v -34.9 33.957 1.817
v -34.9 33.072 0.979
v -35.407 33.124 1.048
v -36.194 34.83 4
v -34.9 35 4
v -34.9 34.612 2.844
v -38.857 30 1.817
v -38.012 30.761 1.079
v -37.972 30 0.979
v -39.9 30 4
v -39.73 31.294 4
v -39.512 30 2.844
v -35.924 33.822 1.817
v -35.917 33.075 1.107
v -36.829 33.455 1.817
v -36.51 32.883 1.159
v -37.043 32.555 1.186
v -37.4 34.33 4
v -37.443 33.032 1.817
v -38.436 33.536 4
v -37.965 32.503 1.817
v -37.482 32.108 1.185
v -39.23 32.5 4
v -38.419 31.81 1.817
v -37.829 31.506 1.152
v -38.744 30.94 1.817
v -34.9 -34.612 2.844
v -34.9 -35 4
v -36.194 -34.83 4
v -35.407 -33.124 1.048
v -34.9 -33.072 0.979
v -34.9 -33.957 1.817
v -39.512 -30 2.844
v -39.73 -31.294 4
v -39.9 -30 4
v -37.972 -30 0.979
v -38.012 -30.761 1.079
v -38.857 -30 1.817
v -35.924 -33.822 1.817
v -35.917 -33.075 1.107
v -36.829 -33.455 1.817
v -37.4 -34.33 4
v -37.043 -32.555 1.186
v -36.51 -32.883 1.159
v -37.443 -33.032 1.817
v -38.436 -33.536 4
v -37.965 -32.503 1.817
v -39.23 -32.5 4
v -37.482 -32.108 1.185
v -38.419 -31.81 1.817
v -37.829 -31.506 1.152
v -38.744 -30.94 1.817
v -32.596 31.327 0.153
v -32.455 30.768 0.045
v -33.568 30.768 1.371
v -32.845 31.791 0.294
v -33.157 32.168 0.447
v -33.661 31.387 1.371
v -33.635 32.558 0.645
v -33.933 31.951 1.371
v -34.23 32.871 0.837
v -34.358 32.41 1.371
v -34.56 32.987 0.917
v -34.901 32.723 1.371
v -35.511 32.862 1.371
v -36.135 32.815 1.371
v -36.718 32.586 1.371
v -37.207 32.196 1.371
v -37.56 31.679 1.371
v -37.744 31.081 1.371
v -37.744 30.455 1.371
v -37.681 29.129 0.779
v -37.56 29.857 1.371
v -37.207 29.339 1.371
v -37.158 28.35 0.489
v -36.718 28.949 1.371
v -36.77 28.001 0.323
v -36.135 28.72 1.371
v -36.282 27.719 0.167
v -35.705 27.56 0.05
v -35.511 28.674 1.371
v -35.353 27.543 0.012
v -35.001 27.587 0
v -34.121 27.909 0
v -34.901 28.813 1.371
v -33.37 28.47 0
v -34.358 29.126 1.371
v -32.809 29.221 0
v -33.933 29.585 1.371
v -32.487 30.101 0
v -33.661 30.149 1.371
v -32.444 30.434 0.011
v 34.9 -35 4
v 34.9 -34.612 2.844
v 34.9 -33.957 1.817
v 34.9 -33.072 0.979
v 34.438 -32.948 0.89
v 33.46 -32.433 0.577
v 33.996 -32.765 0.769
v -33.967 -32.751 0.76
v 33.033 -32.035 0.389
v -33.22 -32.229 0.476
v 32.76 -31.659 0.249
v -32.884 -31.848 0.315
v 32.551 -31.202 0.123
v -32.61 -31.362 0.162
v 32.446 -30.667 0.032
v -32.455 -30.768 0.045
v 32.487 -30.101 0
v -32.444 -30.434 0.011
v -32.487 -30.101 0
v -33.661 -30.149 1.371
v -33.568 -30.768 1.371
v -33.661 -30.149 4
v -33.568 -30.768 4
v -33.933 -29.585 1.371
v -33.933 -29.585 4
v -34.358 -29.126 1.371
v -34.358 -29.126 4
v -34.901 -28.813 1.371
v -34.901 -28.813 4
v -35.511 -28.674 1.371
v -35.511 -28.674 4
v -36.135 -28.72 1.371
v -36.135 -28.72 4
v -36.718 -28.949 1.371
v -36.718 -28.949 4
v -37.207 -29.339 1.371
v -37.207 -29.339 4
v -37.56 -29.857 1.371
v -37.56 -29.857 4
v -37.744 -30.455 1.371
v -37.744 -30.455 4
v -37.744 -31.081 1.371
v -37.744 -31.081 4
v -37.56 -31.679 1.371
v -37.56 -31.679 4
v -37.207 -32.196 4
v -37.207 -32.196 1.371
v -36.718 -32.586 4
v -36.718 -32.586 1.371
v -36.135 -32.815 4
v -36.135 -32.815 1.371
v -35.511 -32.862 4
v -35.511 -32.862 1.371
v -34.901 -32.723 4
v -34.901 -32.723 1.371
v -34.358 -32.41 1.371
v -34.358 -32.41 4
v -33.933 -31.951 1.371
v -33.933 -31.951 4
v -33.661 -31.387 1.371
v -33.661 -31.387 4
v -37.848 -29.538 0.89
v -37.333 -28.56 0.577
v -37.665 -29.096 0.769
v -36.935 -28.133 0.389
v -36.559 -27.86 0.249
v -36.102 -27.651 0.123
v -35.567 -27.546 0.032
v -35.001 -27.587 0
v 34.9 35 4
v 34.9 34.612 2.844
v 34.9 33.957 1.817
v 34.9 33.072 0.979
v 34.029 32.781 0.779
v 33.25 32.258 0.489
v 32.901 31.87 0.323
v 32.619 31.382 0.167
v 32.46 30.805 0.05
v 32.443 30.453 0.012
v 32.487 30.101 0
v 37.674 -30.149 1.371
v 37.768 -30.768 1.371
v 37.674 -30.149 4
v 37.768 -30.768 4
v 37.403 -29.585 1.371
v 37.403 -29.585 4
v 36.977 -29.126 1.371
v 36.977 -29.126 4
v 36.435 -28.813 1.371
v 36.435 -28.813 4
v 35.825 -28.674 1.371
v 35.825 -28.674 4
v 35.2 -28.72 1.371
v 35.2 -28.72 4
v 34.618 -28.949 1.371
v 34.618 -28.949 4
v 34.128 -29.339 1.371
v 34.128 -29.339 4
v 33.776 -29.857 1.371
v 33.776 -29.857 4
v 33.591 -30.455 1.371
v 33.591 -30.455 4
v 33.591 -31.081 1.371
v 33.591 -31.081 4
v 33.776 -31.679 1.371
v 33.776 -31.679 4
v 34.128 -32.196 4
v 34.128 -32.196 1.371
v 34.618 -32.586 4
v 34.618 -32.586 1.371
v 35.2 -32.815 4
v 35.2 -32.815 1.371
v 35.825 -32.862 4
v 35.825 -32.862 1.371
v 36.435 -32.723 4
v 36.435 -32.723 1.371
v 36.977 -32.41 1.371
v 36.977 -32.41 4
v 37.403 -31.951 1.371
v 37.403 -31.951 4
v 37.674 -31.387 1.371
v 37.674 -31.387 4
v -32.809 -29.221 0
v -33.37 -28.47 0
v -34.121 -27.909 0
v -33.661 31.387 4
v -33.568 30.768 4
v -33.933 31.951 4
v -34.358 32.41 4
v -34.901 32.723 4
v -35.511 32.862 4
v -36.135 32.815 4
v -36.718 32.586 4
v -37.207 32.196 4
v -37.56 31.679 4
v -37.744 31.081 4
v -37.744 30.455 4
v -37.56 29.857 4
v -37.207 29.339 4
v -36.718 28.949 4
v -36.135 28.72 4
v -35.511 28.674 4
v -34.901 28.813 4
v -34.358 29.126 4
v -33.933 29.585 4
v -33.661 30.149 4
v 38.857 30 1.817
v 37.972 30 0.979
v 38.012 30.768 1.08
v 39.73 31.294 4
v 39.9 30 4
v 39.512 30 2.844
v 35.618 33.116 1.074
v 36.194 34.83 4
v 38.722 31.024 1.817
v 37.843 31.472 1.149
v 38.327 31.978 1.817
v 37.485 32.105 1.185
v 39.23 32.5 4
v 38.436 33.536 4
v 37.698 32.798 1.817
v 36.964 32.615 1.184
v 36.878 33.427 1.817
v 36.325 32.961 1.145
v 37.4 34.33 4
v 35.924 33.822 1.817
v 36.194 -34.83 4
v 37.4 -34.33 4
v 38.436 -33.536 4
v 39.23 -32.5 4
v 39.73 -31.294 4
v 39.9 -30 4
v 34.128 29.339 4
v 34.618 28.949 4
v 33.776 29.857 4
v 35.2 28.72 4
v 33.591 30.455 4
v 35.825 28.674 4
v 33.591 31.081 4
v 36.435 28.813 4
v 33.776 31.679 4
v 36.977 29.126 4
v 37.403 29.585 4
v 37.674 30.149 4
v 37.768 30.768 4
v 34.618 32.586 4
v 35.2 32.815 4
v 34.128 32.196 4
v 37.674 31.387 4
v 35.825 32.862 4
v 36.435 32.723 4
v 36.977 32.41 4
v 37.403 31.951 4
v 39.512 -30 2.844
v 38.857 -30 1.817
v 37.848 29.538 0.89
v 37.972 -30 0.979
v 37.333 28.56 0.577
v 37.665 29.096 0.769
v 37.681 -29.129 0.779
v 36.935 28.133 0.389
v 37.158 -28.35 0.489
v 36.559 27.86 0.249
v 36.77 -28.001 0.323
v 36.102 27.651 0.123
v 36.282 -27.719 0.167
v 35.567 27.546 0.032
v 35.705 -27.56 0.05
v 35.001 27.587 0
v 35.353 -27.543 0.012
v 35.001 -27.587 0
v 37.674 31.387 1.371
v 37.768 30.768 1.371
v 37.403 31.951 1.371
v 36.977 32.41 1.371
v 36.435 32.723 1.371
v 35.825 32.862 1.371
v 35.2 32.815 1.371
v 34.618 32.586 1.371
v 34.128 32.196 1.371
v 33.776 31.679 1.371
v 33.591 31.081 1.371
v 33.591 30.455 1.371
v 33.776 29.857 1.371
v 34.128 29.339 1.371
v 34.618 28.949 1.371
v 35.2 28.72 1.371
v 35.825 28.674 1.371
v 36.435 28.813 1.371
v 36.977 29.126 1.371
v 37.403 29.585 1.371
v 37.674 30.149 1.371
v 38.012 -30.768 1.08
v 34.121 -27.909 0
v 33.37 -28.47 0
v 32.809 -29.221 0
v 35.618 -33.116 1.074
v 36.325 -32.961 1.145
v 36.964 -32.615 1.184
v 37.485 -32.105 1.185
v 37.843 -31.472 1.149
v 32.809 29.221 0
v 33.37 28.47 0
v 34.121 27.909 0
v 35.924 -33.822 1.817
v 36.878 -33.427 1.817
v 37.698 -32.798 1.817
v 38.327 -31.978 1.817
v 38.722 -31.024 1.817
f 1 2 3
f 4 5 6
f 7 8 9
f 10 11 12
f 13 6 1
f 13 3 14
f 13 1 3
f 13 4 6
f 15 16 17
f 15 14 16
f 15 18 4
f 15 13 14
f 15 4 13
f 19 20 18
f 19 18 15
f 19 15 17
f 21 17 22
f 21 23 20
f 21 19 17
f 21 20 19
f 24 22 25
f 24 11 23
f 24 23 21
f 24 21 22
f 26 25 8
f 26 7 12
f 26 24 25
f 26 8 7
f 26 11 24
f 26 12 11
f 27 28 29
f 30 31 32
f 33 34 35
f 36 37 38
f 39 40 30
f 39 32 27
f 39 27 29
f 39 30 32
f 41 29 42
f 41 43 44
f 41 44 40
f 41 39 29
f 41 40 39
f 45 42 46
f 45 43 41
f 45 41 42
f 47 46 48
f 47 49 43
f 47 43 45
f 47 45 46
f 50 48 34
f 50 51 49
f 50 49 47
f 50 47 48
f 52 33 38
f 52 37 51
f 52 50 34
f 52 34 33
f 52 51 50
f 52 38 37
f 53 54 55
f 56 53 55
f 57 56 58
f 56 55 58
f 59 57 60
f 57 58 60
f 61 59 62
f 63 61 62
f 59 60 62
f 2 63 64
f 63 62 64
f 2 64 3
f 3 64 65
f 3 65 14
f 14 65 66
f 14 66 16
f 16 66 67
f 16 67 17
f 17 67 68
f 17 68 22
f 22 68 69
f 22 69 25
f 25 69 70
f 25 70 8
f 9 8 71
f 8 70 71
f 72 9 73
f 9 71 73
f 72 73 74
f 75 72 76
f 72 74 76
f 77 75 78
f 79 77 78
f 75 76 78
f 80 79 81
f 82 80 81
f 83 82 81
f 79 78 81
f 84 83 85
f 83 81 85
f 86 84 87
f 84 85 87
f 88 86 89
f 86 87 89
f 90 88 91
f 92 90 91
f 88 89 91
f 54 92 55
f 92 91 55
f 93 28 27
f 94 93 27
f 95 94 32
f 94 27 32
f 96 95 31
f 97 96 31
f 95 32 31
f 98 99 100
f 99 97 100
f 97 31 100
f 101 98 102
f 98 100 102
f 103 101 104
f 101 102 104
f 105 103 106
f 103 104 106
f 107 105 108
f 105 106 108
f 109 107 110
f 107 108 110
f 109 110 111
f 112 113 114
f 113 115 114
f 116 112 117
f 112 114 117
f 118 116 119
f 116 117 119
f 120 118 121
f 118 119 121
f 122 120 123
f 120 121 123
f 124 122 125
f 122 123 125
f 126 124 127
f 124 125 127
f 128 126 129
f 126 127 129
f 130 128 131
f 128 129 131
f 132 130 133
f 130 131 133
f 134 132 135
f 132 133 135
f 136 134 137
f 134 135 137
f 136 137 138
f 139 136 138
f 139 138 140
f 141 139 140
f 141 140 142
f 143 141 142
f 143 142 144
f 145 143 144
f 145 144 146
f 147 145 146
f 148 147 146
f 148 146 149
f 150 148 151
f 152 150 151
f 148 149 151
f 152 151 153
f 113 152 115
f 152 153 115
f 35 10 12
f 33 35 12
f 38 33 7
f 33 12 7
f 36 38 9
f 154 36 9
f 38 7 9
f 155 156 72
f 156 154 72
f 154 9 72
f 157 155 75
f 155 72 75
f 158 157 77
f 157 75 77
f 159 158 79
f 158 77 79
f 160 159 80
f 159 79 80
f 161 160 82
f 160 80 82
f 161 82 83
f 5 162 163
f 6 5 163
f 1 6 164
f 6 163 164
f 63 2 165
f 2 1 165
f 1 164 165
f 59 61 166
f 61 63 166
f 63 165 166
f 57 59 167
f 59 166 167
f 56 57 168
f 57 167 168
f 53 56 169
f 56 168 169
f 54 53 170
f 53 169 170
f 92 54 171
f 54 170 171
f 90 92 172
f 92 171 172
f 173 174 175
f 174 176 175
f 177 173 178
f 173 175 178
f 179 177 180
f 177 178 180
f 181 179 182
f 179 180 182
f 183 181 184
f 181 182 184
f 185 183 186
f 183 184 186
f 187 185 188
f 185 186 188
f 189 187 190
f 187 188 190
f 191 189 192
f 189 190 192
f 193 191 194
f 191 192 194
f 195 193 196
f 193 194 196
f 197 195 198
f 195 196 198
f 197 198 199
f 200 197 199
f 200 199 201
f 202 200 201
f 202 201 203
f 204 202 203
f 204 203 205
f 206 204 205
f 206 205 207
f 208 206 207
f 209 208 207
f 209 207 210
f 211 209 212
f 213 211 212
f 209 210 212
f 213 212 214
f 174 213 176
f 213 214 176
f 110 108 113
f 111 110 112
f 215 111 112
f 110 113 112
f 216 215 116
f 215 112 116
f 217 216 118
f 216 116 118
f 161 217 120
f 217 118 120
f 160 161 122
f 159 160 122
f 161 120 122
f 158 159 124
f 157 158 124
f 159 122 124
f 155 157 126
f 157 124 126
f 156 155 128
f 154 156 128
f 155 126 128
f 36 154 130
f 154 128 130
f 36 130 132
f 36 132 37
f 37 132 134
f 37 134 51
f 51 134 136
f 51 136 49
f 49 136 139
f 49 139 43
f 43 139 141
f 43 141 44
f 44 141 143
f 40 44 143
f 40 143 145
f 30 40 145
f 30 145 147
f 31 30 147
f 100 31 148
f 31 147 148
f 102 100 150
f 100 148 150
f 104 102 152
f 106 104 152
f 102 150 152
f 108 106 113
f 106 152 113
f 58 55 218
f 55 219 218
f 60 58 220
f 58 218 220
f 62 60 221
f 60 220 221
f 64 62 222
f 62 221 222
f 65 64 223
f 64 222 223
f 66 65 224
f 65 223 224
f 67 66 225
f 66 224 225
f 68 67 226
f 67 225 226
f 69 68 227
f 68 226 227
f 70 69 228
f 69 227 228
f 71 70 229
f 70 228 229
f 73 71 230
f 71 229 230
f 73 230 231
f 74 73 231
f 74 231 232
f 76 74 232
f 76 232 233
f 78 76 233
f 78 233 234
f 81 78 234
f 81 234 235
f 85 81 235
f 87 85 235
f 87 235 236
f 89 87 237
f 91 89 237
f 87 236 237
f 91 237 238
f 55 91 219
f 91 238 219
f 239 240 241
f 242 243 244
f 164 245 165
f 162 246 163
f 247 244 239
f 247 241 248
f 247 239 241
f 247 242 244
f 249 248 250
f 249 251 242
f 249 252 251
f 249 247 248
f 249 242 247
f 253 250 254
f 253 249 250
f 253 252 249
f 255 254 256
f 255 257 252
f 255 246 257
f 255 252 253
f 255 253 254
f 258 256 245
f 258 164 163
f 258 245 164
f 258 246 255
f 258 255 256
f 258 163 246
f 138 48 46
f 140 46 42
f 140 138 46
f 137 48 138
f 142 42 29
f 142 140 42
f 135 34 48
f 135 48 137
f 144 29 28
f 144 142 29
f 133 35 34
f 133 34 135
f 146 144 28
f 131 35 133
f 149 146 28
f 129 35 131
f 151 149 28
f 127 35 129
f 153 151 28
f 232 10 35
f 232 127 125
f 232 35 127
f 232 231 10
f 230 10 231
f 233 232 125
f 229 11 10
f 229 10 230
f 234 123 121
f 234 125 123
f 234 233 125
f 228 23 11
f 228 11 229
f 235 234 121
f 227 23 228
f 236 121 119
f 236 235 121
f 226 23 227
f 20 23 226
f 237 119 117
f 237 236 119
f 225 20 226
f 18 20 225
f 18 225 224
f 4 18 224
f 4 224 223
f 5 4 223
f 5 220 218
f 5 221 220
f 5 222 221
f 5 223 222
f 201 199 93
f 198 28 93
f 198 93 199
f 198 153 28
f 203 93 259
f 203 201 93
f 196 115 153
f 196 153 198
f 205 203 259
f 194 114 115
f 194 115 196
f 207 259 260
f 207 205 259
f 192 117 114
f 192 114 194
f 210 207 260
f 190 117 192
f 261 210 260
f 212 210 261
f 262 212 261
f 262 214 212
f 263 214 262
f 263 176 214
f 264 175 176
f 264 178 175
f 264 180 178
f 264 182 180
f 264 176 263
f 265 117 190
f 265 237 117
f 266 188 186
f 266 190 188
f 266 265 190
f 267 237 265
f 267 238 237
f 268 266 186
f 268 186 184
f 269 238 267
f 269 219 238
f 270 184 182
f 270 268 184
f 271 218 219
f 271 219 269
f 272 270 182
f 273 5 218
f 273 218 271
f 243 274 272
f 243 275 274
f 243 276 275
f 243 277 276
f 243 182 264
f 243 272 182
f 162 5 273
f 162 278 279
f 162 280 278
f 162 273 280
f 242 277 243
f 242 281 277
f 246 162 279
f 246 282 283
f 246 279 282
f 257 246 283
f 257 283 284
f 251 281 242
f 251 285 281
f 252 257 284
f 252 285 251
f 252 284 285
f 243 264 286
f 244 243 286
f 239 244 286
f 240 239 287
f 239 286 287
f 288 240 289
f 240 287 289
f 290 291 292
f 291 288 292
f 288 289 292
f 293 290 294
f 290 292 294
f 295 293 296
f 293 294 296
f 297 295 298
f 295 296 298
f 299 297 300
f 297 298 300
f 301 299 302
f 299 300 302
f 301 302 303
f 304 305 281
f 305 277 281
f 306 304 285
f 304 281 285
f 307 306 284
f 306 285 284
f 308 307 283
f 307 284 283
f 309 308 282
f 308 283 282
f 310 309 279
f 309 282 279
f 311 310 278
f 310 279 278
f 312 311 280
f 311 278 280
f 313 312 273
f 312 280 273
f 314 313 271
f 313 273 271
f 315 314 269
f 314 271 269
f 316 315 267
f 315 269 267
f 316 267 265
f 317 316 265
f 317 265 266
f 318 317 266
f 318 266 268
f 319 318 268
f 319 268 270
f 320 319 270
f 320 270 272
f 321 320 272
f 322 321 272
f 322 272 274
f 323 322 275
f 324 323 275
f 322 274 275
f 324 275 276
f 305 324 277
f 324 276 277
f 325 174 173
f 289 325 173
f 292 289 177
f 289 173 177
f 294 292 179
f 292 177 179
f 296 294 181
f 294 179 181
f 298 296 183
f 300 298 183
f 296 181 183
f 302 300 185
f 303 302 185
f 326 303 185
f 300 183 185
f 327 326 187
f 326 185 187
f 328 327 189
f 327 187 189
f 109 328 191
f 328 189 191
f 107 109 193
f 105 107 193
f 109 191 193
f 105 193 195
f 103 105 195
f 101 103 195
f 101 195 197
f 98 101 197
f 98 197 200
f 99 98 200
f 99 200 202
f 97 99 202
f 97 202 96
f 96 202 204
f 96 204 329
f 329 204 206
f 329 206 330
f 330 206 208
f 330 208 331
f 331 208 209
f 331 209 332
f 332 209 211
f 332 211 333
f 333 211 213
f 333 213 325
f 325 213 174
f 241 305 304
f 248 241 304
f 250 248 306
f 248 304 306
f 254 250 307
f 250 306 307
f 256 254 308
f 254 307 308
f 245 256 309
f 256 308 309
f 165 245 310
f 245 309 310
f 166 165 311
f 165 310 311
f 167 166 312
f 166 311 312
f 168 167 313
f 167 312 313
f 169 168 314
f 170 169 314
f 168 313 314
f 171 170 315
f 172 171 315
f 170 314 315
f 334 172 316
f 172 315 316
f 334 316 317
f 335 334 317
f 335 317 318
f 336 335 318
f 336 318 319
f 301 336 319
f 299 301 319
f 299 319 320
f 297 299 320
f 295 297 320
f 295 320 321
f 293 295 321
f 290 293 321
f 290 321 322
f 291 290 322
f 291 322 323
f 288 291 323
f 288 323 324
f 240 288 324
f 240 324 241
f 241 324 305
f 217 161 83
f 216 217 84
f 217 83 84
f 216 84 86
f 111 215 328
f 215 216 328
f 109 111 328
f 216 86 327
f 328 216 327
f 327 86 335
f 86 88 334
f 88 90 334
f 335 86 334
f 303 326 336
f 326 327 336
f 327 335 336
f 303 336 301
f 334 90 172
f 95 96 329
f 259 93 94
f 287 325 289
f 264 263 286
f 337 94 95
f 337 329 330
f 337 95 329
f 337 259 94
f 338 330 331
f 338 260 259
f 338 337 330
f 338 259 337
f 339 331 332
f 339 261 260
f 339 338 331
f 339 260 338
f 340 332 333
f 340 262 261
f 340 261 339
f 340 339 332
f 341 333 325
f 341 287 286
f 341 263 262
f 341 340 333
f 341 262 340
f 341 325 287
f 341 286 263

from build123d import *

# Parameters (mm, degrees)
IZIM1_W                     = 79.8
IZIM1_H                     = 70
Y_KSEKLIK_EKSTR_ZYON1_DEPTH = 4
RADYUS1_R                   = 5
RADYUS2_R                   = 5
DELIK1_D                    = 4.2
DELIK1_DEPTH                = 5
DELIK1_CSINK_D              = 6.5
DELIK1_CSINK_ANGLE          = 80


with BuildPart() as part:
    # Çizim1 → Yükseklik-Ekstrüzyon1 (new body)
    with BuildSketch(Plane.XY):
        Rectangle(IZIM1_W, IZIM1_H)
    extrude(amount=Y_KSEKLIK_EKSTR_ZYON1_DEPTH)

    # Radyus1
    radyus1_edges = [part.edges().sort_by_distance(p)[0] for p in [
        (39.9, -35, 2),
        (-39.9, -35, 2),
        (-39.9, 35, 2),
        (39.9, 35, 2),
    ]]
    fillet(radyus1_edges, radius=RADYUS1_R)

    # Radyus2
    # the kernel refuses this fillet: 5 mm, written as the material it takes off along each edge
    with BuildSketch(Plane(origin=(34.9, -30, 0), x_dir=(0, -1, 0), z_dir=(-1, 0, 0))) as radyus2_piece_1:
        with BuildLine():
            CenterArc((0.101020514, 5), RADYUS2_R, 270, 78.463040967)
            Line((5, 4), (5.09797959, 3.98))
            ThreePointArc((5.09797959, 3.98), (5.1, 2), (5.1, 0))
            Line((5.1, 0), (5, -0.1))
            Line((5, -0.1), (0.101020514, -0.1))
            Line((0.101020514, -0.1), (0.101020514, 0))
        make_face()
    revolve(axis=Axis((34.9, -30, 0), (0, 0, 1)), revolution_arc=90, mode=Mode.SUBTRACT)
    with BuildSketch(Plane(origin=(-34.9, -35, 0), x_dir=(0, 1.5720758028687172e-12, 1.0), z_dir=(1, 0, 0))) as radyus2_piece_2:
        with BuildLine():
            CenterArc((5, -4.898979486), RADYUS2_R, 101.536959033, 78.463040967)
            Line((0, -4.898979486), (-0.1, -4.898979486))
            Line((-0.1, -4.898979486), (-0.1, 0))
            Line((-0.1, 0), (0, 0.1))
            ThreePointArc((0, 0.1), (2, 0.1), (3.98, 0.09797959))
            Line((3.98, 0.09797959), (4, 0))
        make_face()
    extrude(amount=69.8, mode=Mode.SUBTRACT)
    with BuildSketch(Plane(origin=(-34.9, -30, 0), x_dir=(0, -1, 0), z_dir=(1, 0, 0))) as radyus2_piece_3:
        with BuildLine():
            CenterArc((0.101020514, -5), RADYUS2_R, 11.536959033, 78.463040967)
            Line((5, -4), (5.09797959, -3.98))
            ThreePointArc((5.09797959, -3.98), (5.1, -2), (5.1, 0))
            Line((5.1, 0), (5, 0.1))
            Line((5, 0.1), (0.101020514, 0.1))
            Line((0.101020514, 0.1), (0.101020514, 0))
        make_face()
    revolve(axis=Axis((-34.9, -30, 0), (0, 0, -1)), revolution_arc=90, mode=Mode.SUBTRACT)
    with BuildSketch(Plane(origin=(-39.9, 30, 0), x_dir=(1, 0, 0), z_dir=(0, -1, 0)), Plane(origin=(39.9, -30, 0), x_dir=(-1, 0, 0), z_dir=(0, 1, 0))) as radyus2_piece_4:
        with BuildLine():
            CenterArc((4.898979486, 5), RADYUS2_R, 191.536959033, 78.463040967)
            Line((0, 4), (-0.09797959, 3.98))
            ThreePointArc((-0.09797959, 3.98), (-0.1, 2), (-0.1, 0))
            Line((-0.1, 0), (0, -0.1))
            Line((0, -0.1), (4.898979486, -0.1))
            Line((4.898979486, -0.1), (4.898979486, 0))
        make_face()
    extrude(amount=60, mode=Mode.SUBTRACT)
    with BuildSketch(Plane(origin=(-34.9, 30, 0), x_dir=(0, 1, 0), z_dir=(1, 0, 0))) as radyus2_piece_5:
        with BuildLine():
            CenterArc((0.101020514, 5), RADYUS2_R, 270, 78.463040967)
            Line((5, 4), (5.09797959, 3.98))
            ThreePointArc((5.09797959, 3.98), (5.1, 2), (5.1, 0))
            Line((5.1, 0), (5, -0.1))
            Line((5, -0.1), (0.101020514, -0.1))
            Line((0.101020514, -0.1), (0.101020514, 0))
        make_face()
    revolve(axis=Axis((-34.9, 30, 0), (0, 0, 1)), revolution_arc=90, mode=Mode.SUBTRACT)
    with BuildSketch(Plane(origin=(34.9, 35, 0), x_dir=(0, -1, 0), z_dir=(-1, 0, 0))) as radyus2_piece_6:
        with BuildLine():
            CenterArc((4.898979486, 5), RADYUS2_R, 191.536959033, 78.463040967)
            Line((0, 4), (-0.09797959, 3.98))
            ThreePointArc((-0.09797959, 3.98), (-0.1, 2), (-0.1, 0))
            Line((-0.1, 0), (0, -0.1))
            Line((0, -0.1), (4.898979486, -0.1))
            Line((4.898979486, -0.1), (4.898979486, 0))
        make_face()
    extrude(amount=69.8, mode=Mode.SUBTRACT)
    with BuildSketch(Plane(origin=(34.9, 30, 0), x_dir=(1, 0, 0), z_dir=(0, -1, 0))) as radyus2_piece_7:
        with BuildLine():
            CenterArc((0.101020514, 5), RADYUS2_R, 270, 78.463040967)
            Line((5, 4), (5.09797959, 3.98))
            ThreePointArc((5.09797959, 3.98), (5.1, 2), (5.1, 0))
            Line((5.1, 0), (5, -0.1))
            Line((5, -0.1), (0.101020514, -0.1))
            Line((0.101020514, -0.1), (0.101020514, 0))
        make_face()
    revolve(axis=Axis((34.9, 30, 0), (0, 0, 1)), revolution_arc=90, mode=Mode.SUBTRACT)

    # Delik1
    with Locations(Plane(origin=(0, 0, 0), x_dir=(-1, 0, 0), z_dir=(0, 0, -1))):
        with Locations((-35.667766953, 30.767766953), (35.667766953, 30.767766953), (35.667766953, -30.767766953), (-35.667766953, -30.767766953)):
            CounterSinkHole(DELIK1_D / 2, DELIK1_CSINK_D / 2, depth=DELIK1_DEPTH, counter_sink_angle=DELIK1_CSINK_ANGLE)


solid = part.part
